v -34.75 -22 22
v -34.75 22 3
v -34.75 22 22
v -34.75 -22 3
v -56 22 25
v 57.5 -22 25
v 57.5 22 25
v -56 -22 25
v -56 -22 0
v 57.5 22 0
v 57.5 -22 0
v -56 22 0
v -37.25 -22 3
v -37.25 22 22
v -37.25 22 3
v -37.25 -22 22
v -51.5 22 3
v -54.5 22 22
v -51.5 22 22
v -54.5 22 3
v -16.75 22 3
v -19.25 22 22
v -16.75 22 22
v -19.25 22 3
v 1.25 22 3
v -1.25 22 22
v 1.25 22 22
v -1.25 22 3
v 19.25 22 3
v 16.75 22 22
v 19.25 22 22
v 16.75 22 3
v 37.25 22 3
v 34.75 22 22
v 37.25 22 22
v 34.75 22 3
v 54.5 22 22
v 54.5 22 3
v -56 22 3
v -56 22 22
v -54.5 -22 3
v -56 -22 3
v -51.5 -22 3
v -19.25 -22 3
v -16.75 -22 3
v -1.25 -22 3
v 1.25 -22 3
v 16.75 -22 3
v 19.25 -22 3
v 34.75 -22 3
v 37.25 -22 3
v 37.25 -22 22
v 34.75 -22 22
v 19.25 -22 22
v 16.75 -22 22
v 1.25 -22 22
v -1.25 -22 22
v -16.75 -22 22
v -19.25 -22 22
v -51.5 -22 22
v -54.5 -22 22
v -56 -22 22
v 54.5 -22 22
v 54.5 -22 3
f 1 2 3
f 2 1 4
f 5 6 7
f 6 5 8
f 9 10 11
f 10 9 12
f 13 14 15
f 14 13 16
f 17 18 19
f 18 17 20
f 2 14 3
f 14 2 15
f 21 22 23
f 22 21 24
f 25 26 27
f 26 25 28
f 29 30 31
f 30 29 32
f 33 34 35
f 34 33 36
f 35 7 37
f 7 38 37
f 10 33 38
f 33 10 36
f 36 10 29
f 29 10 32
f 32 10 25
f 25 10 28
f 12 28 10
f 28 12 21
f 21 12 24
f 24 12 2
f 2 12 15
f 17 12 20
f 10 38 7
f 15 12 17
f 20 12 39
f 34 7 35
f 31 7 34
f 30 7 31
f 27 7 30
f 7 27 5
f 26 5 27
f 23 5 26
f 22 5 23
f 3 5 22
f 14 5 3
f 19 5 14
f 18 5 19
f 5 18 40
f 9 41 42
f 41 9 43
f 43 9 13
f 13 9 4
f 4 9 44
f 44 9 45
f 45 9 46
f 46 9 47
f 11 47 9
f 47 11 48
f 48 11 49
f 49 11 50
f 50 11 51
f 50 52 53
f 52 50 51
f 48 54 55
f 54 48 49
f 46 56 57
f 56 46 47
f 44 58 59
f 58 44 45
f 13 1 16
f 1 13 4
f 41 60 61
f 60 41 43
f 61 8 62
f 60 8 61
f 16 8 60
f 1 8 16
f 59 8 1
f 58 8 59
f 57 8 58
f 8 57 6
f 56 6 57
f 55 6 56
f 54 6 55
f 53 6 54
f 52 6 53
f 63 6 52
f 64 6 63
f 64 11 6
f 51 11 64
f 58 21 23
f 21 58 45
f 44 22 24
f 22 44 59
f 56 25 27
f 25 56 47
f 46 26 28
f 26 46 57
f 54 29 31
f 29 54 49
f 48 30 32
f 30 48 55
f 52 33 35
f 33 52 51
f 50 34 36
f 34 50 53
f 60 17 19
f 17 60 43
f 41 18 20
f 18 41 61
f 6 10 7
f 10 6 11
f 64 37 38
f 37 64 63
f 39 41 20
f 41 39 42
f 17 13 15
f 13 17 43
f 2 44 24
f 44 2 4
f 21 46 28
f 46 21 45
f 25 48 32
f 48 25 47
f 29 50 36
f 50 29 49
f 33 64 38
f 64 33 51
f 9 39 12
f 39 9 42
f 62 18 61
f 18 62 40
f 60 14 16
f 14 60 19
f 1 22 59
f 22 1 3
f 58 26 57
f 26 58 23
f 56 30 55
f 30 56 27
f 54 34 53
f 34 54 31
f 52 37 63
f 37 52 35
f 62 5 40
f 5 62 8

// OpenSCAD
// Open-sided cuvette rack for twelve 12.5mm square cuvettes
// Designed for FDM printing, standing on the base plate.

// --- Dimensions ---
base_x      = 112.0;  // Length of base plate (X)
base_y      = 44.0;   // Width of base plate (Y)
base_z      = 3.0;    // Thickness of base plate
deck_z_min  = 22.0;   // Bottom of deck plate (Z)
deck_z_max  = 25.0;   // Top of deck plate (Z)
wall_thick  = 3.0;    // Thickness of the end walls
rib_thick   = 2.5;    // Thickness of the internal ribs
hole_size   = 13.0;   // Size of the square holes (13x13mm)
hole_pitch  = 18.0;   // Center-to-center spacing of holes
rows        = 2;      // Number of rows of holes (Y)
cols        = 6;      // Number of columns of holes (X)

// Rib X-positions (centered on origin)
rib_x_pos   = [-36, -18, 0, 18, 36];

$fn = 64;

// --- Geometry Construction ---

// 1. The Base Plate
base_plate = [base_x, base_y, base_z];

// 2. The Deck Plate
deck_plate = [base_x, base_y, deck_z_max - deck_z_min];

// 3. The Walls/Ribs
// End walls are flush with the short ends (Y direction)
// Ribs are centered at specific X positions
module walls() {
    // End walls
    translate([-(base_x/2) + (wall_thick/2), -(base_y/2), 0])
        cube([wall_thick, base_y, deck_z_max]);
    
    translate([(base_x/2) - (wall_thick/2), -(base_y/2), 0])
        cube([wall_thick, base_y, deck_z_max]);
    
    // Internal ribs
    for (rx = rib_x_pos) {
        translate([rx - (rib_thick/2), -(base_y/2), 0])
            cube([rib_thick, base_y, deck_z_max]);
    }
}

// 4. The Holes (to be subtracted from the deck)
module holes() {
    // Calculate starting offset to center the grid on the deck
    // Grid span = (cols-1)*pitch. Offset = (base_x - span)/2
    // However, user specified "18mm centre-to-center and centred on the deck"
    // We calculate the offset based on the grid dimensions.
    
    grid_x_span = (cols - 1) * hole_pitch;
    grid_y_span = (rows - 1) * hole_pitch;
    
    offset_x = (base_x - grid_x_span) / 2;
    offset_y = (base_y - grid_y_span) / 2;

    for (i = [0 : cols - 1]) {
        for (j = [0 : rows - 1]) {
            translate([
                (i * hole_pitch) - (grid_x_span / 2) + (base_x/2) - (base_x/2), // Logic check:
                // Let's use a simpler approach for centering:
                // Center of grid is at 0,0.
                // Hole i,j center is:
                (i - (cols - 1) / 2.0) * hole_pitch,
                (j - (rows - 1) / 2.0) * hole_pitch,
                -1 // Extend below deck
            ])
            // Re-calculating translation for clarity:
            // We want the hole center to be at (i - (cols-1)/2)*pitch
            // But the loop is relative to the origin.
            // Let's use the standard centered loop:
            translate([0,0,0]) // dummy
            cube([hole_size, hole_size, deck_z_max + 2], center = true); 
            // Wait, the above is messy. Let's rewrite the hole loop clearly.
        }
    }
}

// Corrected Hole Loop
module hole_grid() {
    grid_x_span = (cols - 1) * hole_pitch;
    grid_y_span = (rows - 1) * hole_pitch;
    
    for (i = [0 : cols - 1]) {
        for (j = [0 : rows - 1]) {
            // Calculate center of each hole relative to origin (0,0)
            cx = (i - (cols - 1) / 2.0) * hole_pitch;
            cy = (j - (rows - 1) / 2.0) * hole_pitch;
            
            translate([cx, cy, deck_z_min - 0.01])
                cube([hole_size, hole_size, deck_z_max - deck_z_min + 0.02]);
        }
    }
}

// --- Final Assembly ---

union() {
    // Base Plate
    translate([-base_x/2, -base_y/2, 0])
        cube([base_x, base_y, base_z]);

    // Deck Plate
    translate([-base_x/2, -base_y/2, deck_z_min])
        cube([base_x, base_y, deck_z_max - deck_z_min]);

    // Walls
    walls();
}

// Subtract the holes from the deck
difference() {
    // We use a dummy union to ensure the difference works on the whole assembly
    // but we only want to cut the deck.
    // To be safe, we'll just subtract from the deck specifically.
    // However, the prompt implies the holes are "through-holes" in the deck.
    
    // We'll use a trick: define the whole object, then subtract holes.
    // But since we are using union for the base, we must be careful.
    // Let's restructure the final assembly.
}

// RESTRUCTURED FINAL ASSEMBLY
// (This is the actual rendered part)

// We will use a single difference block for the whole part
// to ensure clean subtraction.

// Note: The code below is the actual logic that will be rendered.
// I will wrap the previous logic into a single block.

// [RE-WRITING ASSEMBLY FOR FINAL OUTPUT]
